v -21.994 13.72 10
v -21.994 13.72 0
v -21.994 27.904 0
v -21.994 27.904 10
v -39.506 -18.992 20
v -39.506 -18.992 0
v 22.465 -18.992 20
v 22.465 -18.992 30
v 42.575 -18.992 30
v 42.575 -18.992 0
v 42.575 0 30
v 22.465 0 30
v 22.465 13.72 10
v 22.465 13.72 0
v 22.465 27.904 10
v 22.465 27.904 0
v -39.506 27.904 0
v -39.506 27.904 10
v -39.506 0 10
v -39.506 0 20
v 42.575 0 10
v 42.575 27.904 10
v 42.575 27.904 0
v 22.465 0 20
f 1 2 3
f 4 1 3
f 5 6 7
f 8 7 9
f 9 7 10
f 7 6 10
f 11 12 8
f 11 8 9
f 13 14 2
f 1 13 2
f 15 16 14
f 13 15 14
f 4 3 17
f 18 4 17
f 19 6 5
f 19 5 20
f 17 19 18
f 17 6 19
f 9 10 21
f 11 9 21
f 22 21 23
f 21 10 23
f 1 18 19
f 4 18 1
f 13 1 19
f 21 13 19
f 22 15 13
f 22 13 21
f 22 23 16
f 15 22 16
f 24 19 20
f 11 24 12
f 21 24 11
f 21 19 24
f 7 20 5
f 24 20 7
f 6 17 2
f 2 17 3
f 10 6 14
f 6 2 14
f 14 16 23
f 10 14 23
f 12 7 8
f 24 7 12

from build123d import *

# Parameters (mm, degrees)
EXTRUDE_1_DEPTH = 10
SKETCH_1_3_W    = 20.109572138
SKETCH_1_3_H    = 18.992234217
EXTRUDE_2_DEPTH = 30
SKETCH_1_4_W    = 61.971467386
SKETCH_1_4_H    = 18.992234217
EXTRUDE_3_DEPTH = 20


with BuildPart() as part:
    # 草圖1 → 填料-伸長1 (new body)
    with BuildSketch(Plane.XY):
        Polygon((-39.506294724, 27.903717876), (-39.506294724, 0), (22.465172662, 0), (42.5747448, 0), (42.5747448, 27.903717876), (22.465172662, 27.903717876), (22.465172662, 13.719879355), (-21.993563511, 13.719879355), (-21.993563511, 27.903717876), align=None)
    extrude(amount=EXTRUDE_1_DEPTH)

    # 草圖1<3> → 填料-伸長2 (add)
    with BuildSketch(Plane.XY):
        with Locations((32.519958731, -9.496117109)):
            Rectangle(SKETCH_1_3_W, SKETCH_1_3_H)
    extrude(amount=EXTRUDE_2_DEPTH)

    # 草圖1<4> → 填料-伸長3 (add)
    with BuildSketch(Plane.XY):
        with Locations((-8.520561031, -9.496117109)):
            Rectangle(SKETCH_1_4_W, SKETCH_1_4_H)
    extrude(amount=EXTRUDE_3_DEPTH)


solid = part.part
